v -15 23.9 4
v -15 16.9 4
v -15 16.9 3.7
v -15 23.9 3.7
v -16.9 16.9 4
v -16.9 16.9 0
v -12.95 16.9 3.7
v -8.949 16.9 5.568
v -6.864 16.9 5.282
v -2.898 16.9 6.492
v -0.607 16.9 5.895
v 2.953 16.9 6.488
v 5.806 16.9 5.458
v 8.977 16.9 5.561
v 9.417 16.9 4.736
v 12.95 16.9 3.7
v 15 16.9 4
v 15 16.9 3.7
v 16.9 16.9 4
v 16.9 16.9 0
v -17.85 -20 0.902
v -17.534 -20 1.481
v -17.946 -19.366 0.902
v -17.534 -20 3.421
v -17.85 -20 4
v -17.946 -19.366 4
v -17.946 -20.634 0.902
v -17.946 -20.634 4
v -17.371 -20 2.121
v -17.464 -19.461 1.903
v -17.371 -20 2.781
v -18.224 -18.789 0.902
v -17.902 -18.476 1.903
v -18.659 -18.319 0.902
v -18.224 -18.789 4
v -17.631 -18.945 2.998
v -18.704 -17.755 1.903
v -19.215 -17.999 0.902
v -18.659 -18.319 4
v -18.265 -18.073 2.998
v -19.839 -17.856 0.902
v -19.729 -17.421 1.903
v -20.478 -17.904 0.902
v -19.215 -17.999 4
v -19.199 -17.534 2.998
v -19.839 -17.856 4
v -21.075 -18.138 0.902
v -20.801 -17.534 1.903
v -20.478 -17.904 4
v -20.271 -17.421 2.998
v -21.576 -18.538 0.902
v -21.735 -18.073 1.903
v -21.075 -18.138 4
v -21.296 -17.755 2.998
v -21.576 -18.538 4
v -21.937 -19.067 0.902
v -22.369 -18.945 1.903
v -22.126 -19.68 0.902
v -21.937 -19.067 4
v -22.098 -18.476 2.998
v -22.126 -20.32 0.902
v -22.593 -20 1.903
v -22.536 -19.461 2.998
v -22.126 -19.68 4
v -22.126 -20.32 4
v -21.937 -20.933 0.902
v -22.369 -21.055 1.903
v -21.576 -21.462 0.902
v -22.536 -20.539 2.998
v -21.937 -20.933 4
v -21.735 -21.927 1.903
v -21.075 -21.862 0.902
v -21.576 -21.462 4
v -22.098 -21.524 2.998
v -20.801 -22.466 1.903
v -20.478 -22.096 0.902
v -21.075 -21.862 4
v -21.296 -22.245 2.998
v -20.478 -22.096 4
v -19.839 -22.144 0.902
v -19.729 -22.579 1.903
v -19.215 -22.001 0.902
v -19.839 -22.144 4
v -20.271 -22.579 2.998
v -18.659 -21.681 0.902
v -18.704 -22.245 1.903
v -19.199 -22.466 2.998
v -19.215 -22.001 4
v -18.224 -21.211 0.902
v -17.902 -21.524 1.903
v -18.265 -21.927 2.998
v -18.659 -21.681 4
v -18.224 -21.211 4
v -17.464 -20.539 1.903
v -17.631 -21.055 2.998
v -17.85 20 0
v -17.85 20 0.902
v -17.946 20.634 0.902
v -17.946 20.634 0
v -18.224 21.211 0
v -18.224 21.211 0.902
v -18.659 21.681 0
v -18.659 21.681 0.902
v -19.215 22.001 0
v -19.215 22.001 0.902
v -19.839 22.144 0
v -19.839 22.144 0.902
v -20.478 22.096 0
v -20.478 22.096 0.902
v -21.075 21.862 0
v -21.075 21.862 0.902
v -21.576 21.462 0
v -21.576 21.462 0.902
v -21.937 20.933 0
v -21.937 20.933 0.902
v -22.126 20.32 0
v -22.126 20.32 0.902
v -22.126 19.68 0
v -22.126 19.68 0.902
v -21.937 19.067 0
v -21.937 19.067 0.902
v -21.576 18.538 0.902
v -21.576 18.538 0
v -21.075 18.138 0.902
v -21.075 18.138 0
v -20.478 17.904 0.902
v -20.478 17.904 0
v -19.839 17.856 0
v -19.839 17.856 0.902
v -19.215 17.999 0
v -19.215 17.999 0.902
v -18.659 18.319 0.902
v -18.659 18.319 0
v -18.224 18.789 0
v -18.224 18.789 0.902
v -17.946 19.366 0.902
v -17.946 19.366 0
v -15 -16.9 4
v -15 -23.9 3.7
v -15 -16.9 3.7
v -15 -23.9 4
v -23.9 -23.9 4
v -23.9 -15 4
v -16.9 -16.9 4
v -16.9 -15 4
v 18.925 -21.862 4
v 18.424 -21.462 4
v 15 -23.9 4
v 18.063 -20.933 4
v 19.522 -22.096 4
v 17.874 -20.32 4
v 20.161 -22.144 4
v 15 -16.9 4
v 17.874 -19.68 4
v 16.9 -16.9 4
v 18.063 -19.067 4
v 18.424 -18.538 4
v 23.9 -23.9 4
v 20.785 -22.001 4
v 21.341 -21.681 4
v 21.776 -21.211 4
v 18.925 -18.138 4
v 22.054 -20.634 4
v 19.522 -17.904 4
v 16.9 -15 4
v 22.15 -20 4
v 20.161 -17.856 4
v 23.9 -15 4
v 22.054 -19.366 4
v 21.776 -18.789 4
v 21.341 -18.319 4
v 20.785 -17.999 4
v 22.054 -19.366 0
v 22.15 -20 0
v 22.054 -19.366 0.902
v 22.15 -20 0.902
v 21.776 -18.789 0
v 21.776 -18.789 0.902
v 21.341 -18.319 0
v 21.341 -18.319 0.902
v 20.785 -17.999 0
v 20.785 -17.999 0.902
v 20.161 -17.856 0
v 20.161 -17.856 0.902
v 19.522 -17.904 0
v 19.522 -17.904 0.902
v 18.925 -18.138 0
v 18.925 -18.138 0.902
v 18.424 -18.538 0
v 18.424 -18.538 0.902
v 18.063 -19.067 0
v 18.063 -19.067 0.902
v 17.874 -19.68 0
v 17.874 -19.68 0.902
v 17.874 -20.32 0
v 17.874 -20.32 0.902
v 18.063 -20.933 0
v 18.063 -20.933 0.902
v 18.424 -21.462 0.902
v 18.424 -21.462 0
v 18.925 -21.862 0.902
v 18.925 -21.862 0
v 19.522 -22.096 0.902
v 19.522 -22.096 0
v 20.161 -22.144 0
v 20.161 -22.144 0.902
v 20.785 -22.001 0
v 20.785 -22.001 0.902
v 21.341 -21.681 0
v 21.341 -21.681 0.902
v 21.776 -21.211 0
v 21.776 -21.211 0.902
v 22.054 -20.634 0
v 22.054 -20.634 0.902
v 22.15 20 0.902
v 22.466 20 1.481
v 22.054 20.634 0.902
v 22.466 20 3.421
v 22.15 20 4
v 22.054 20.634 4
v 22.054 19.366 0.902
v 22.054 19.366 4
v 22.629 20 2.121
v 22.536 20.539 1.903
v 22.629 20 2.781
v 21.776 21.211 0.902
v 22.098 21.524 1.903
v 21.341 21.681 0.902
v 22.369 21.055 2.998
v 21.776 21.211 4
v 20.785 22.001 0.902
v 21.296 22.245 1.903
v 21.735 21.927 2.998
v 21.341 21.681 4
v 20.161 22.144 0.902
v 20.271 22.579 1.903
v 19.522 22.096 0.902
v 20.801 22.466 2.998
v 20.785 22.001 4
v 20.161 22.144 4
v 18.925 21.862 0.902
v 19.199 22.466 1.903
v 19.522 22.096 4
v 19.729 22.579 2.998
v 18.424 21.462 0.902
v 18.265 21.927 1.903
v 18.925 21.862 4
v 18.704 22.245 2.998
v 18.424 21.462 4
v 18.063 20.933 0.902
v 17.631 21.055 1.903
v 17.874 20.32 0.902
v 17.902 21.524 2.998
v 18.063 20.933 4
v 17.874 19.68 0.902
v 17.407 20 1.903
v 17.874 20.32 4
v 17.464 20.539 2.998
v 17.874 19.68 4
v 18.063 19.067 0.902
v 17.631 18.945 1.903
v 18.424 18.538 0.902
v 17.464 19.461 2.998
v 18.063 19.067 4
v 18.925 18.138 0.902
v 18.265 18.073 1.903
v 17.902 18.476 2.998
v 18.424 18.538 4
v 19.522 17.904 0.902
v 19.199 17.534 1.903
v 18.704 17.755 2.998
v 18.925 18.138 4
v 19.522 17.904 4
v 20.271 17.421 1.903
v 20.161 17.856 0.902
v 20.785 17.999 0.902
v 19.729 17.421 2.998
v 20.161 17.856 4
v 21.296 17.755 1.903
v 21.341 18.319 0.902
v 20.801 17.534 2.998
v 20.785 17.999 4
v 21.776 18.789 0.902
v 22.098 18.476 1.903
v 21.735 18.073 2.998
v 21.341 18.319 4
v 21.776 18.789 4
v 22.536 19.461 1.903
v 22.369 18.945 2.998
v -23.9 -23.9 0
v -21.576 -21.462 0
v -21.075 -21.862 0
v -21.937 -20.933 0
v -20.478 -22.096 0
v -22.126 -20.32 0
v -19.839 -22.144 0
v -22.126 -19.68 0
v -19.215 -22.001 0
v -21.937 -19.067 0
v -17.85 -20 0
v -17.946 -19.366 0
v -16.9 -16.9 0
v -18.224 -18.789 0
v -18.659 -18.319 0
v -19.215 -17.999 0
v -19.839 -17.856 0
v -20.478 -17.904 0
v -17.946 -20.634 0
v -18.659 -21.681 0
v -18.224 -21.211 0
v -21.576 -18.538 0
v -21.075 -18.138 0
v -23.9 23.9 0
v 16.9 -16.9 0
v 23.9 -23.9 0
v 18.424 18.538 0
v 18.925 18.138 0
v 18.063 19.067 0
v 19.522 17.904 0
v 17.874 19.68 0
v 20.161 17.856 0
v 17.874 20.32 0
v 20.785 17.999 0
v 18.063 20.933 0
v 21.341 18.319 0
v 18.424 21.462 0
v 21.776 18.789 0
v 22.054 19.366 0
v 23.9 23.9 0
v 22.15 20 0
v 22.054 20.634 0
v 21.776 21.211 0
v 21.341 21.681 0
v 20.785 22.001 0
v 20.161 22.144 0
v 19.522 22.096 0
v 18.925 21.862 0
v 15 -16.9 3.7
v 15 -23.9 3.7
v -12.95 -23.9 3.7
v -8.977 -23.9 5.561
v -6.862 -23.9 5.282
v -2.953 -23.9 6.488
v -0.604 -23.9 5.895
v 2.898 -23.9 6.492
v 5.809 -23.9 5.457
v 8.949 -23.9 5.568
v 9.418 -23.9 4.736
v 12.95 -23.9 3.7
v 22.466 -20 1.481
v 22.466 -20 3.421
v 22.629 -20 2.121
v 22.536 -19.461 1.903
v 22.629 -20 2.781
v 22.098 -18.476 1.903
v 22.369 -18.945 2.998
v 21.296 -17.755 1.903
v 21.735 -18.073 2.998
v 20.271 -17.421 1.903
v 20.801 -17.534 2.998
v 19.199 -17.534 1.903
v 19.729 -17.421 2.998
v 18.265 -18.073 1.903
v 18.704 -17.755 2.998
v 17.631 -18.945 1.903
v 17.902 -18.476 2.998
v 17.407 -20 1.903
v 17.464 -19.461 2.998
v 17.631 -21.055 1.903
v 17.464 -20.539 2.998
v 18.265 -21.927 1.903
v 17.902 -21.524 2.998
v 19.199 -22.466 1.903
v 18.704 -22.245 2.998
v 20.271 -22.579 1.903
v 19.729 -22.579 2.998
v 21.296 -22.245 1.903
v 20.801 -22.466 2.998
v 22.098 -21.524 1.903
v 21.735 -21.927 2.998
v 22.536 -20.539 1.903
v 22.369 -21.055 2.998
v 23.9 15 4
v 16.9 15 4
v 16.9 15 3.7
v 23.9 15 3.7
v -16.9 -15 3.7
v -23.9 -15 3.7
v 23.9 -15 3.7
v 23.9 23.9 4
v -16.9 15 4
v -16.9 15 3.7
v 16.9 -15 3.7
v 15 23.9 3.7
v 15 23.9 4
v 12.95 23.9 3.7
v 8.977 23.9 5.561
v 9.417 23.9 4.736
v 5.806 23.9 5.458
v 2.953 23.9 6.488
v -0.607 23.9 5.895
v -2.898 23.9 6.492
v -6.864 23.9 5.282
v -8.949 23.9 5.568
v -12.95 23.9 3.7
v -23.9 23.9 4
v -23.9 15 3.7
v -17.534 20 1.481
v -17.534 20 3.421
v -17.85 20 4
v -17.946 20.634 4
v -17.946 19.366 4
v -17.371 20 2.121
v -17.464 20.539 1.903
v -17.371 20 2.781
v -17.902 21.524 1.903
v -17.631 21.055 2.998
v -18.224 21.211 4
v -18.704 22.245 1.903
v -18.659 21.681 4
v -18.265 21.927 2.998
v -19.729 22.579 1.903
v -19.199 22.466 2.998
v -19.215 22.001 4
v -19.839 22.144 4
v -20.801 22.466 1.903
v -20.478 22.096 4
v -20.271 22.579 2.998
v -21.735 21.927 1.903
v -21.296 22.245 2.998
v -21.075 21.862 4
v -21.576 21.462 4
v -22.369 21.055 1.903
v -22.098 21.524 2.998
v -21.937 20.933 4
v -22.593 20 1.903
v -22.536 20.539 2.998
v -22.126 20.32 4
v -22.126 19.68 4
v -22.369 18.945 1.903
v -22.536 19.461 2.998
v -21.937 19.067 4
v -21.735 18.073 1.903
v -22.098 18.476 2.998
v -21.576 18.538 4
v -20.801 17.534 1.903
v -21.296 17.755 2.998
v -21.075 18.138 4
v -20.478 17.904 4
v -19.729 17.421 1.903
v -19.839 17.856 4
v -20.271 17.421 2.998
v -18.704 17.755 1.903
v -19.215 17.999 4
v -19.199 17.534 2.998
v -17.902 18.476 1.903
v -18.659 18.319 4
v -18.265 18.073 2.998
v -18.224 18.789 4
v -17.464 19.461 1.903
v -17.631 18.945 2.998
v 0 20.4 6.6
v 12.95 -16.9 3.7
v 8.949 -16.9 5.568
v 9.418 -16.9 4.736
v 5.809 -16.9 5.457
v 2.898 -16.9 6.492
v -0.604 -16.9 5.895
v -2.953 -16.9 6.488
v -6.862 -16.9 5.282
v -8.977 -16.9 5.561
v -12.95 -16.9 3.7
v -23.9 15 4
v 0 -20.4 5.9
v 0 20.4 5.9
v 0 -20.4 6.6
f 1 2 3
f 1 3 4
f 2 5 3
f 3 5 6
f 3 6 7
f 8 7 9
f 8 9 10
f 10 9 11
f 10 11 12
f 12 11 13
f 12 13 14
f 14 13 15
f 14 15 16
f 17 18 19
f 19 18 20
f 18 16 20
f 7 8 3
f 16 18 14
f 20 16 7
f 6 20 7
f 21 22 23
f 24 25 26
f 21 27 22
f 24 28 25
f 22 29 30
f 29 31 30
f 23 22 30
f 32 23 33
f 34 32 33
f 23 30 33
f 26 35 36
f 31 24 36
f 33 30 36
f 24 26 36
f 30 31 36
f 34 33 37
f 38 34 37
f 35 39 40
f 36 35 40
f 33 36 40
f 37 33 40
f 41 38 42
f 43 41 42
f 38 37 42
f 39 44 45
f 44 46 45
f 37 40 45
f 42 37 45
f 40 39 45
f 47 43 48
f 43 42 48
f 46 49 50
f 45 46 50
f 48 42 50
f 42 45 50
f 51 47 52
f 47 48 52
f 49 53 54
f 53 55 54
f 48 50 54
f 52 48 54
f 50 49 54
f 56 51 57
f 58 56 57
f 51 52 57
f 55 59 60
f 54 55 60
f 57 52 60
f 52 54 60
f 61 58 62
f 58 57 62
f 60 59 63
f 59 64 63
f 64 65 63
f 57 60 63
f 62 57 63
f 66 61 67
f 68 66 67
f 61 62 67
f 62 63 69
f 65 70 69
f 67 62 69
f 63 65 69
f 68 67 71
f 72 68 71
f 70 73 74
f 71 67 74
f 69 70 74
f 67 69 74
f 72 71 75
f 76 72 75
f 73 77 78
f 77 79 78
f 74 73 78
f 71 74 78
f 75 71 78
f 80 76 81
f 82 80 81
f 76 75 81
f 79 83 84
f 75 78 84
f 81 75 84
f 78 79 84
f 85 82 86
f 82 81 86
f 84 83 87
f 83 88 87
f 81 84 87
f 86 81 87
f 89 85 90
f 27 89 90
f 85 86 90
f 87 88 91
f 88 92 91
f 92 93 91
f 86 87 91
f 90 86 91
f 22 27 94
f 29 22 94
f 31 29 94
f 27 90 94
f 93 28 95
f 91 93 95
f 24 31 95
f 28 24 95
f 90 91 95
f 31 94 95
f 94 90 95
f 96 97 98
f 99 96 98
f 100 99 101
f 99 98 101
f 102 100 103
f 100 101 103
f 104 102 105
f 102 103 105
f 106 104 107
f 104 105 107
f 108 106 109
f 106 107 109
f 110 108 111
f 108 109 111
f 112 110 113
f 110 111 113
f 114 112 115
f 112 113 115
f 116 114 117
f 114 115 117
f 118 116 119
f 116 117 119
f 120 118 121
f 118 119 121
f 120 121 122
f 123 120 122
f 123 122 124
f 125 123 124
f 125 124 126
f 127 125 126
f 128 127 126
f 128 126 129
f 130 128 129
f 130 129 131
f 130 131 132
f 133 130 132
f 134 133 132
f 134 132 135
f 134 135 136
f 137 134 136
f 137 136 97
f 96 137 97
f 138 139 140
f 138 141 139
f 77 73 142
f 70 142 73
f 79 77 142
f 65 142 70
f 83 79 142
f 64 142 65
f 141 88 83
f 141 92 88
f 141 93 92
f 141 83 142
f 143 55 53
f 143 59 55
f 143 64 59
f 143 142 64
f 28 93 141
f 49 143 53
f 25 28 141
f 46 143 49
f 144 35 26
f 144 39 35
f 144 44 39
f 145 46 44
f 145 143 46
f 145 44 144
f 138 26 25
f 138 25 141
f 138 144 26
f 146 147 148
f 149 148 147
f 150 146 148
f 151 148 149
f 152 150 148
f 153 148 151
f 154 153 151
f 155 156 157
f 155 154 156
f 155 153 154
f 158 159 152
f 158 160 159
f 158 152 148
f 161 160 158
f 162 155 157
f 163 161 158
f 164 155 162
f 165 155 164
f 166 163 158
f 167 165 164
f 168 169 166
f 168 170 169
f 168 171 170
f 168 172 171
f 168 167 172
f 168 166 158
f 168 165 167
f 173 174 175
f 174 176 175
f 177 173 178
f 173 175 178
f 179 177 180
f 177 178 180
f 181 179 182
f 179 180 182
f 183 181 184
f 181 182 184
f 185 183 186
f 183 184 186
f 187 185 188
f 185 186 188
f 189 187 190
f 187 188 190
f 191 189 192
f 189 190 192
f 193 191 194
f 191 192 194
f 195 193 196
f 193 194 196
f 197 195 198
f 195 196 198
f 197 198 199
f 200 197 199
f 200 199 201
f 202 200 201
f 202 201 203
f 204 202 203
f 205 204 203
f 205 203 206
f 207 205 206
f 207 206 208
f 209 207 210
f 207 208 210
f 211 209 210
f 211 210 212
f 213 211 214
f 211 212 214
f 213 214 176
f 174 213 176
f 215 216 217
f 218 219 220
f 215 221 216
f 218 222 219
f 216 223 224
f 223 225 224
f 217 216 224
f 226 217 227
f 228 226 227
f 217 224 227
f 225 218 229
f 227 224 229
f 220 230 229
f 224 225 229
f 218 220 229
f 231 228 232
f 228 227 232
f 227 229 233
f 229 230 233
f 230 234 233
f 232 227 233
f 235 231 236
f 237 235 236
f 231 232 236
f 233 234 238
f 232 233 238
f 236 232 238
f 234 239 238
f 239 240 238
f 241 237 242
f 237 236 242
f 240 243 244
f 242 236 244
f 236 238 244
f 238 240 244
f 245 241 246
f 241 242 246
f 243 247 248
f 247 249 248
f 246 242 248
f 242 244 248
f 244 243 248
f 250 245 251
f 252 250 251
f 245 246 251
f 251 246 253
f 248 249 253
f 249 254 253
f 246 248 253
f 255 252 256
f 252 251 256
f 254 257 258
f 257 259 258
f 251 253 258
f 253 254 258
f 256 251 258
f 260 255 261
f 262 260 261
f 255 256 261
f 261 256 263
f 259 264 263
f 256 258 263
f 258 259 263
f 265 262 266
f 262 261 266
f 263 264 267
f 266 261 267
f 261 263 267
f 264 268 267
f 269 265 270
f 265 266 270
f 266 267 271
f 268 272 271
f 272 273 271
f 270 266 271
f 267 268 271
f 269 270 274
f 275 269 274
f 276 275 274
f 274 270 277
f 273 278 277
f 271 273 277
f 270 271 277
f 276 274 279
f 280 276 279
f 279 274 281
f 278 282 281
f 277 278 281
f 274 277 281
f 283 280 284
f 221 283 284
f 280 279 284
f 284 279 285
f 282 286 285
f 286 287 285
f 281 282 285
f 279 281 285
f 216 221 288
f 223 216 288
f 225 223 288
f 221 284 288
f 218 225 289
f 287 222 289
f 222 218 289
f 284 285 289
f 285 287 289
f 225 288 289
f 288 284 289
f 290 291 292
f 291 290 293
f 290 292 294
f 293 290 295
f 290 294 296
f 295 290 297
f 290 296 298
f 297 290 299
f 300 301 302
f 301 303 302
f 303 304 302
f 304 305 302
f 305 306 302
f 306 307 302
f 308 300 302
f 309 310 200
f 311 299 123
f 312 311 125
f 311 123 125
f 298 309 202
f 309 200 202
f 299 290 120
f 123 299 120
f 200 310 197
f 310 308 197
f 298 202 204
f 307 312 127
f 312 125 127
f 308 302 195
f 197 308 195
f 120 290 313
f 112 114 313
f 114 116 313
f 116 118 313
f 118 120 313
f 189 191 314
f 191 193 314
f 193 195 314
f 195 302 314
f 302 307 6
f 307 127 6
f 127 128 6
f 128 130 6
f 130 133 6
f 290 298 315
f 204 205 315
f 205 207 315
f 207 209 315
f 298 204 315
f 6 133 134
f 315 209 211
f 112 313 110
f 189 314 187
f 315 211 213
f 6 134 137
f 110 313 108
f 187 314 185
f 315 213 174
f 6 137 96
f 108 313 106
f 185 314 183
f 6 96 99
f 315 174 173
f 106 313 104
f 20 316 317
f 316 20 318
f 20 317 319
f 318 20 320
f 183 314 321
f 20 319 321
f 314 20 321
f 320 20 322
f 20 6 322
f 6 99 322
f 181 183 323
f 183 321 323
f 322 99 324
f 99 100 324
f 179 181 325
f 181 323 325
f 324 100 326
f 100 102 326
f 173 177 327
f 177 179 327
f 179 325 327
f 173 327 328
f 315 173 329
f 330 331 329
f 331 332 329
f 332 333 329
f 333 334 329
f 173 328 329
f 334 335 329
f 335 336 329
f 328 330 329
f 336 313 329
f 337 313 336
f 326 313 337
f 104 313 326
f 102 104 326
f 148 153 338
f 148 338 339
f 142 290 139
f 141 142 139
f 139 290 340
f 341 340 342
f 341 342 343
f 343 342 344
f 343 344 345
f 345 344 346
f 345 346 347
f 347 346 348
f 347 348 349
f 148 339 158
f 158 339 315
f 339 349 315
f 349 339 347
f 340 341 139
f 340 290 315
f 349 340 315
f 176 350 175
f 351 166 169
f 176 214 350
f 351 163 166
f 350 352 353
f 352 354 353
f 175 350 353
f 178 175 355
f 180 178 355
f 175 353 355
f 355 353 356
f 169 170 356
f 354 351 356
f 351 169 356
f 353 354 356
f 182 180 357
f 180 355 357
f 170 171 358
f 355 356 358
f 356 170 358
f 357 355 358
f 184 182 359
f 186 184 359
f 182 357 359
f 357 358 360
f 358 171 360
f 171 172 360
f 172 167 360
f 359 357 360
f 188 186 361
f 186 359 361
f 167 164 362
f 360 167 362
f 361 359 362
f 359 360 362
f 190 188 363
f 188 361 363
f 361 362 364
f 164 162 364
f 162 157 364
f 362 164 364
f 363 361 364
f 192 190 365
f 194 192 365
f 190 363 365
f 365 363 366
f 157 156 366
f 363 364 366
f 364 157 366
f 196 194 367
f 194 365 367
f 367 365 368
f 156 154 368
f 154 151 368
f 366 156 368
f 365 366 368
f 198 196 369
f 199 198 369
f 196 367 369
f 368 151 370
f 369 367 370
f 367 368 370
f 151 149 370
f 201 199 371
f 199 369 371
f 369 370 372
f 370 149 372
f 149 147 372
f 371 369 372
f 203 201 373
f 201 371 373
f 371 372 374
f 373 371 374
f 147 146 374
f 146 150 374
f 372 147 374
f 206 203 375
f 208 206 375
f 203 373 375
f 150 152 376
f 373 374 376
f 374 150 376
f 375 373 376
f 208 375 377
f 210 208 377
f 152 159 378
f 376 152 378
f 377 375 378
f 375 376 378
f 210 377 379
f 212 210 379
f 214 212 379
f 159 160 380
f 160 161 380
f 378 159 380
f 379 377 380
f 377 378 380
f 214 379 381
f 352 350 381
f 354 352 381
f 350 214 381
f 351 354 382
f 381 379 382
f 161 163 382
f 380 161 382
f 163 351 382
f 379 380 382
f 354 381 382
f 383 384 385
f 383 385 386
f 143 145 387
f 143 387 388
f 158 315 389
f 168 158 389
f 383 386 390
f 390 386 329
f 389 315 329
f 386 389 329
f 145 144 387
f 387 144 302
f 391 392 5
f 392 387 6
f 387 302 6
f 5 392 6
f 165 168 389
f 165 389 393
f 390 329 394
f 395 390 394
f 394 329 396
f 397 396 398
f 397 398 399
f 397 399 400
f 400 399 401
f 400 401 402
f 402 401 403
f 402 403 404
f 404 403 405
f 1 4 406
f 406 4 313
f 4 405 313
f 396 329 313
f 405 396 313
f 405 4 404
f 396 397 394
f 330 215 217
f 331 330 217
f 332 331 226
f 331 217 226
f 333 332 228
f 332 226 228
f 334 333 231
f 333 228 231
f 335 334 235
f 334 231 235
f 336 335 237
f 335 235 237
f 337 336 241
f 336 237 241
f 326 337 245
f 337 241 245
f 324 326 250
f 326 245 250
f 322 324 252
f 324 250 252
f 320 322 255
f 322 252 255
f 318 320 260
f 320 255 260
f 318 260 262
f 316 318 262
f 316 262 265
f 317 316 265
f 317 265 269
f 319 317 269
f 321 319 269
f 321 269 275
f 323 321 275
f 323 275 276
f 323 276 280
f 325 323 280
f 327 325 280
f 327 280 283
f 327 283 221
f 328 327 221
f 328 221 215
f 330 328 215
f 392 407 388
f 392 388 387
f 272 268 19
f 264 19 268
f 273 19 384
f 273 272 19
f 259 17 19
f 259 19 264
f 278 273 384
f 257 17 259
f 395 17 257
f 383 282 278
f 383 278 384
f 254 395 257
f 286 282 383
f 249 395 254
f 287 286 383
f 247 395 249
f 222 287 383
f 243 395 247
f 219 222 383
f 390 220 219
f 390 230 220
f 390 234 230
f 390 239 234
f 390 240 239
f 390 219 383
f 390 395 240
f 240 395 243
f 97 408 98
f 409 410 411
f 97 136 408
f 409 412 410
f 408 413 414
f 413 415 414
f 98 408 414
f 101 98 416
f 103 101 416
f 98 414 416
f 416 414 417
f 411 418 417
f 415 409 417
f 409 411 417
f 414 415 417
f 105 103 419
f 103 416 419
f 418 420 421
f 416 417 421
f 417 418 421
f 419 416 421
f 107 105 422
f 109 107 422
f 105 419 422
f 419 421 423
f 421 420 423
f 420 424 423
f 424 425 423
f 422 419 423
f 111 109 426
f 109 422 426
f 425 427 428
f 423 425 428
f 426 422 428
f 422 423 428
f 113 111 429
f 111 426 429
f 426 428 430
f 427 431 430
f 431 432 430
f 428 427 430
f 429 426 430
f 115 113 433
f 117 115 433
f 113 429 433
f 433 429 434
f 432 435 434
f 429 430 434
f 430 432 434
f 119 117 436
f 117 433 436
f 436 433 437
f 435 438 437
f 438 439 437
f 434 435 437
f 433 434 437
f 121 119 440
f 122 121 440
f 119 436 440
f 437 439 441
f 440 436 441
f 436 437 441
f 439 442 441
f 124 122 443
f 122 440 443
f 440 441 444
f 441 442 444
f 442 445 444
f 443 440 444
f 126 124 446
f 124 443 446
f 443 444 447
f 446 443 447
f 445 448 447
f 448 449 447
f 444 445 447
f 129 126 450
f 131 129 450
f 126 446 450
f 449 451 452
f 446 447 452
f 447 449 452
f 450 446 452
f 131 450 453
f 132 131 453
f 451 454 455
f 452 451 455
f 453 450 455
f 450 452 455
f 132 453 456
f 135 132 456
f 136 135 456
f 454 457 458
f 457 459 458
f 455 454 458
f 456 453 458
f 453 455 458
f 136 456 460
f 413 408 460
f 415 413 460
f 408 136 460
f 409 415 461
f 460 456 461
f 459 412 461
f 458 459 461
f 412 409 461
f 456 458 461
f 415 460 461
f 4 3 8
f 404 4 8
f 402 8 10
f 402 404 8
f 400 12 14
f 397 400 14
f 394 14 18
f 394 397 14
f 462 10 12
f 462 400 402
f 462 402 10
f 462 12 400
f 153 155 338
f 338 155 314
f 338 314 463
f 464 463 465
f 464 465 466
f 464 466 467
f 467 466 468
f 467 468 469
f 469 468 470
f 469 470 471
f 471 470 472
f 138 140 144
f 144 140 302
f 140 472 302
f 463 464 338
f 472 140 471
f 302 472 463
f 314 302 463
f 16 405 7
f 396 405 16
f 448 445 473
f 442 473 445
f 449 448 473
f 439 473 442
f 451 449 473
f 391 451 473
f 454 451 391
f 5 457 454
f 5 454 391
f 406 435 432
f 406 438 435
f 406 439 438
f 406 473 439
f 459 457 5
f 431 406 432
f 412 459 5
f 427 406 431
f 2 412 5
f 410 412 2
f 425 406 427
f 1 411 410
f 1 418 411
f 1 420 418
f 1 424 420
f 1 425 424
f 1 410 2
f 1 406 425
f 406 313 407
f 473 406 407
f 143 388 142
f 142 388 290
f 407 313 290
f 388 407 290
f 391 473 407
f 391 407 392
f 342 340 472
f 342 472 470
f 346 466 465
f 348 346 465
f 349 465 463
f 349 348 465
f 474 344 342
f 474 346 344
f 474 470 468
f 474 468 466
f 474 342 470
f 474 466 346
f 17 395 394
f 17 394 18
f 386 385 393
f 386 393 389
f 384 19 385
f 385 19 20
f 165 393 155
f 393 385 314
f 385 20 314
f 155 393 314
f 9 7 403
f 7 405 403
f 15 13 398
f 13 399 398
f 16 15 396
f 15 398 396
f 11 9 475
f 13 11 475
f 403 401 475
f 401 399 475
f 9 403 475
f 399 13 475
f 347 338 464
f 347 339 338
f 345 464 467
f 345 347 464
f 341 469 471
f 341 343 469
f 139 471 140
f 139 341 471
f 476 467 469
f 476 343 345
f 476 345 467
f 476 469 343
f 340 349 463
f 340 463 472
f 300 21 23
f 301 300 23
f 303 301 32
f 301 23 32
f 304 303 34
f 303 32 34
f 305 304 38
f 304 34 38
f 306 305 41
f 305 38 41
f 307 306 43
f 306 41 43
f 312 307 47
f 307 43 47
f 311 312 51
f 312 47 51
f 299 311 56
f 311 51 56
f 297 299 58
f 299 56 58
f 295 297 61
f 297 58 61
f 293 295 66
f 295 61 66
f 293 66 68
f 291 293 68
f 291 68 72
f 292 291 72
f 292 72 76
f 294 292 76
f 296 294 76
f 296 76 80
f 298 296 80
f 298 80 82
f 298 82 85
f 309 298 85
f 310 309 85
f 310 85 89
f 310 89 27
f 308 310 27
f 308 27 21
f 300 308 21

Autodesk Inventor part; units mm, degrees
ref_plane "YZ Plane" through (0, 0, 0) normal (1, 0, 0) x (0, 1, 0)
ref_plane "XZ Plane" through (0, 0, 0) normal (0, 1, 0) x (-1, 0, 0)
ref_plane "XY Plane" through (0, 0, 0) normal (0, 0, 1) x (1, 0, 0)
sketch "Sketch1" plane through (0, 0, 0) normal (0, 0, 1) x (1, 0, 0)
  line L0 (-16.9, -16.9) -> (-16.9, 16.9)
  line L1 (-16.9, 16.9) -> (16.9, 16.9)
  line L2 (16.9, 16.9) -> (16.9, -16.9)
  line L3 (16.9, -16.9) -> (-16.9, -16.9)
  circle A0 centre (-20, 20) radius 2.75
  circle A1 centre (20, -20) radius 2.75
  circle A2 centre (20, 20) radius 2.75
  circle A3 centre (-20, -20) radius 2.75
  line L4 (-22.9, 22.9) -> (22.9, 22.9)
  line L5 (-22.9, -22.9) -> (-22.9, 22.9)
  line L6 (22.9, -22.9) -> (-22.9, -22.9)
  line L7 (22.9, 22.9) -> (22.9, -22.9)
  line L8 (23.9, 23.9) -> (-23.9, 23.9)
  line L9 (-23.9, 23.9) -> (-23.9, -23.9)
  line L10 (-23.9, -23.9) -> (23.9, -23.9)
  line L11 (23.9, -23.9) -> (23.9, 23.9)
  point P0 (0, 0)
  point P1 (0, 0)
  dimension "d8" = 1
extrude "Extrusion1" add sketch "Sketch1" along normal blind 4 contours A0 | A1 | A2 | A3 | L4 L7 L6 L5 | L11 L10 L9 L8
sketch "Sketch2" plane through (0, 0, 4) normal (0, 0, 1) x (1, 0, 0)
  line L0 (-16.9, 16.9) -> (16.9, 16.9) projected
  line L1 (16.9, 16.9) -> (16.9, -16.9) projected
  line L2 (16.9, -16.9) -> (-16.9, -16.9) projected
  line L3 (-16.9, -16.9) -> (-16.9, 16.9) projected
  line L4 (-16.9, -16.9) -> (-16.9, 16.9)
  line L5 (-16.9, 16.9) -> (16.9, 16.9)
  line L6 (16.9, 16.9) -> (16.9, -16.9)
  line L7 (16.9, -16.9) -> (-16.9, -16.9)
  circle A0 centre (-20, 20) radius 2.15
  circle A1 centre (20, -20) radius 2.15
  circle A2 centre (20, 20) radius 2.15
  circle A3 centre (-20, -20) radius 2.15
  line L8 (-22.9, 22.9) -> (22.9, 22.9)
  line L9 (-22.9, -22.9) -> (-22.9, 22.9)
  line L10 (22.9, -22.9) -> (-22.9, -22.9)
  line L11 (22.9, 22.9) -> (22.9, -22.9)
  point P0 (0, 0)
  point P1 (0, 0)
  dimension "d2" = 4.3
  dimension "d3" = 4.3
  dimension "d4" = 4.3
  dimension "d5" = 4.3
extrude "Extrusion2" cut sketch "Sketch2" against normal through all contours A0 | A1 | A2 | A3
ref_plane "Work Plane1" through (-20, -20, 4) normal (0, -1, 0) x (1, 0, 0)
sketch "Sketch3" plane through (-20, -20, 4) normal (0, -1, 0) x (1, 0, 0)
  line L0 (2.15, -4) -> (-2.15, -4) projected
  line L1 (-2.15, 0) -> (2.15, 0) projected
  line L2 (43.9, -4) -> (-3.9, -4) projected
  line L3 (-3.9, -4) -> (-3.9, 0) projected
  line L4 (43.9, 0) -> (-3.9, 0) projected
  line L5 (43.9, -4) -> (43.9, 0) projected
  line L6 (0, 2.9614) -> (0, -7.6552) construction
  arc A0 (-2.15, 0) -> (0, -4.1992) centre (0, -1.5492) ccw
  line L7 (0, 1.1008) -> (0, -4.1992)
  arc A1 (0, 1.1008) -> (-2.15, 0) centre (0, -1.5492) ccw
  arc A2 (0, -4.1992) -> (0, 1.1008) centre (0, -1.5492) ccw
  point P0 (20, -4)
  point P1 (0, -4)
  dimension "d10" = 5.3
revolve "Revolution1" cut sketch "Sketch3" angle 360 about axis through (-20, -20, 5.1008) along (0, 0, -1) contours A2 L7 L0 | L0 L7 L1 A2 | L1 L7 A2
pattern_linear "Rectangular Pattern1" count 2 spacing 40 along (1, 0, 0) count 2 spacing 40 along (0, 1, 0) of "Revolution1"
sketch "Sketch4" plane through (0, 0, 4) normal (0, 0, 1) x (1, 0, 0)
  circle A0 centre (20, 20) radius 2.15 projected
  circle A1 centre (-20, 20) radius 2.15 projected
  circle A2 centre (20, -20) radius 2.15 projected
  circle A3 centre (-20, -20) radius 2.15 projected
  line L0 (-16.9, 16.9) -> (16.9, 16.9) projected
  line L1 (16.9, 16.9) -> (16.9, -16.9) projected
  line L2 (16.9, -16.9) -> (-16.9, -16.9) projected
  line L3 (-16.9, -16.9) -> (-16.9, 16.9) projected
  line L4 (23.9, 23.9) -> (-23.9, 23.9) projected
  line L5 (-23.9, 23.9) -> (-23.9, -23.9) projected
  line L6 (-23.9, -23.9) -> (23.9, -23.9) projected
  line L7 (23.9, -23.9) -> (23.9, 23.9) projected
  line L8 (-33.46, 0) -> (33.46, 0) construction
  line L9 (0, -33.46) -> (0, 33.46) construction
  line L10 (-15, 23.9) -> (15, 23.9)
  line L11 (15, 23.9) -> (15, 16.9)
  line L12 (15, 16.9) -> (-15, 16.9)
  line L13 (-15, 16.9) -> (-15, 23.9)
  line L14 (-23.9, -15) -> (-23.9, 15)
  line L15 (-16.9, -15) -> (-23.9, -15)
  line L16 (-16.9, 15) -> (-16.9, -15)
  line L17 (-23.9, 15) -> (-16.9, 15)
  line L18 (15, -23.9) -> (-15, -23.9)
  line L19 (15, -16.9) -> (15, -23.9)
  line L20 (-15, -16.9) -> (15, -16.9)
  line L21 (-15, -23.9) -> (-15, -16.9)
  line L22 (23.9, 15) -> (23.9, -15)
  line L23 (16.9, 15) -> (23.9, 15)
  line L24 (16.9, -15) -> (16.9, 15)
  line L25 (23.9, -15) -> (16.9, -15)
  point P0 (0, 0)
  dimension "d18" = 30
  dimension "d21" = 360
extrude "Extrusion3" cut sketch "Sketch4" against normal blind 0.3 contours L13 L4 L11 L0 | L3 L15 L5 L17 | L23 L7 L25 L1 | L2 L19 L6 L21
sketch "Sketch5" plane through (-23.9, 23.9, 0) normal (0, 1, 0) x (1, 0, 0)
  line L0 (38.9, -3.7) -> (38.9, -4) construction
  line L1 (47.8, -4) -> (38.9, -4) construction
  line L2 (47.8, 0) -> (47.8, -4) construction
  line L3 (47.8, 0) -> (0, 0) construction
  line L4 (0, 0) -> (0, -4) construction
  line L5 (8.9, -4) -> (0, -4) construction
  line L6 (8.9, -4) -> (8.9, -3.7) construction
  line L7 (8.9, -3.7) -> (38.9, -3.7) construction
  line L8 (23.9, 0) -> (23.9, -19.2449) construction
  line L9 (38.9, -3.7) -> (8.9, -3.7) projected
  line L10 (8.9, -3.7) -> (23.9, -9.5) construction
  line L11 (23.9, -9.5) -> (38.9, -3.7) construction
  spline S0 degree 2 poles (8.9, -3.7) (23.9, -9.5) (38.9, -3.7) knots 1 1 1 2 2 2
  line L12 (23.9, -3.7) -> (23.9, -6.6) construction
  line L13 (9.225, -3.0751) -> (8.9, -3.7)
  line L14 (38.9, -4) -> (38.9, -3.7) projected
  line L15 (38.575, -3.0751) -> (38.9, -3.7)
  spline S1 degree 5 poles (9.225, -3.0751) (12.0305, -4.1545) (14.9217, -5.0099) (17.888, -5.6036) (23.9, -6.1963) (29.912, -5.6036) (32.8783, -5.0099) (35.7695, -4.1545) (38.575, -3.0751) knots 0 0 0 0 0 0 0.5 0.5 0.5 1 1 1 1 1 1
  dimension "d26" = 0.7
  dimension "d25" = 2.9
extrude "Extrusion4" add sketch "Sketch5" against normal up to surface (7 mm away) contours S0 L9 S1 | L9 S1 L15 | L13 S1 L9
sketch "Sketch6" plane through (-23.9, -23.9, 0) normal (0, -1, 0) x (1, 0, 0)
  line L0 (36.8497, 3.7) -> (10.9503, 3.7) projected
  spline S0 degree 5 poles (10.9504, 3.7) (13.4491, 4.5486) (16.01, 5.2141) (18.6221, 5.6716) (23.9, 6.1284) (29.1779, 5.6716) (31.79, 5.2141) (34.3509, 4.5486) (36.8496, 3.7) knots 0 0 0 0 0 0 0.5 0.5 0.5 1 1 1 1 1 1 projected
  spline S1 degree 2 poles (38.9, 3.7) (23.9, 9.5) (8.9, 3.7) knots 0 0 0 1 1 1 projected
  line L1 (8.9, 3.7) -> (8.9, 4) projected
  line L2 (7, 4) -> (8.9, 4) projected
  line L3 (7, 0) -> (7, 4) projected
  line L4 (40.8, 0) -> (7, 0) projected
  line L5 (40.8, 0) -> (40.8, 4) projected
  line L6 (38.9, 4) -> (40.8, 4) projected
  line L7 (38.9, 4) -> (38.9, 3.7) projected
  point P0 (23.9, 0)
extrude "Extrusion5" add sketch "Sketch6" against normal up to surface (7 mm away)
equation "\"d3\" = d2"
equation "\"d4\" = d2"
equation "\"d5\" = d2"
properties part number "30_Sampleclamp_generic"
